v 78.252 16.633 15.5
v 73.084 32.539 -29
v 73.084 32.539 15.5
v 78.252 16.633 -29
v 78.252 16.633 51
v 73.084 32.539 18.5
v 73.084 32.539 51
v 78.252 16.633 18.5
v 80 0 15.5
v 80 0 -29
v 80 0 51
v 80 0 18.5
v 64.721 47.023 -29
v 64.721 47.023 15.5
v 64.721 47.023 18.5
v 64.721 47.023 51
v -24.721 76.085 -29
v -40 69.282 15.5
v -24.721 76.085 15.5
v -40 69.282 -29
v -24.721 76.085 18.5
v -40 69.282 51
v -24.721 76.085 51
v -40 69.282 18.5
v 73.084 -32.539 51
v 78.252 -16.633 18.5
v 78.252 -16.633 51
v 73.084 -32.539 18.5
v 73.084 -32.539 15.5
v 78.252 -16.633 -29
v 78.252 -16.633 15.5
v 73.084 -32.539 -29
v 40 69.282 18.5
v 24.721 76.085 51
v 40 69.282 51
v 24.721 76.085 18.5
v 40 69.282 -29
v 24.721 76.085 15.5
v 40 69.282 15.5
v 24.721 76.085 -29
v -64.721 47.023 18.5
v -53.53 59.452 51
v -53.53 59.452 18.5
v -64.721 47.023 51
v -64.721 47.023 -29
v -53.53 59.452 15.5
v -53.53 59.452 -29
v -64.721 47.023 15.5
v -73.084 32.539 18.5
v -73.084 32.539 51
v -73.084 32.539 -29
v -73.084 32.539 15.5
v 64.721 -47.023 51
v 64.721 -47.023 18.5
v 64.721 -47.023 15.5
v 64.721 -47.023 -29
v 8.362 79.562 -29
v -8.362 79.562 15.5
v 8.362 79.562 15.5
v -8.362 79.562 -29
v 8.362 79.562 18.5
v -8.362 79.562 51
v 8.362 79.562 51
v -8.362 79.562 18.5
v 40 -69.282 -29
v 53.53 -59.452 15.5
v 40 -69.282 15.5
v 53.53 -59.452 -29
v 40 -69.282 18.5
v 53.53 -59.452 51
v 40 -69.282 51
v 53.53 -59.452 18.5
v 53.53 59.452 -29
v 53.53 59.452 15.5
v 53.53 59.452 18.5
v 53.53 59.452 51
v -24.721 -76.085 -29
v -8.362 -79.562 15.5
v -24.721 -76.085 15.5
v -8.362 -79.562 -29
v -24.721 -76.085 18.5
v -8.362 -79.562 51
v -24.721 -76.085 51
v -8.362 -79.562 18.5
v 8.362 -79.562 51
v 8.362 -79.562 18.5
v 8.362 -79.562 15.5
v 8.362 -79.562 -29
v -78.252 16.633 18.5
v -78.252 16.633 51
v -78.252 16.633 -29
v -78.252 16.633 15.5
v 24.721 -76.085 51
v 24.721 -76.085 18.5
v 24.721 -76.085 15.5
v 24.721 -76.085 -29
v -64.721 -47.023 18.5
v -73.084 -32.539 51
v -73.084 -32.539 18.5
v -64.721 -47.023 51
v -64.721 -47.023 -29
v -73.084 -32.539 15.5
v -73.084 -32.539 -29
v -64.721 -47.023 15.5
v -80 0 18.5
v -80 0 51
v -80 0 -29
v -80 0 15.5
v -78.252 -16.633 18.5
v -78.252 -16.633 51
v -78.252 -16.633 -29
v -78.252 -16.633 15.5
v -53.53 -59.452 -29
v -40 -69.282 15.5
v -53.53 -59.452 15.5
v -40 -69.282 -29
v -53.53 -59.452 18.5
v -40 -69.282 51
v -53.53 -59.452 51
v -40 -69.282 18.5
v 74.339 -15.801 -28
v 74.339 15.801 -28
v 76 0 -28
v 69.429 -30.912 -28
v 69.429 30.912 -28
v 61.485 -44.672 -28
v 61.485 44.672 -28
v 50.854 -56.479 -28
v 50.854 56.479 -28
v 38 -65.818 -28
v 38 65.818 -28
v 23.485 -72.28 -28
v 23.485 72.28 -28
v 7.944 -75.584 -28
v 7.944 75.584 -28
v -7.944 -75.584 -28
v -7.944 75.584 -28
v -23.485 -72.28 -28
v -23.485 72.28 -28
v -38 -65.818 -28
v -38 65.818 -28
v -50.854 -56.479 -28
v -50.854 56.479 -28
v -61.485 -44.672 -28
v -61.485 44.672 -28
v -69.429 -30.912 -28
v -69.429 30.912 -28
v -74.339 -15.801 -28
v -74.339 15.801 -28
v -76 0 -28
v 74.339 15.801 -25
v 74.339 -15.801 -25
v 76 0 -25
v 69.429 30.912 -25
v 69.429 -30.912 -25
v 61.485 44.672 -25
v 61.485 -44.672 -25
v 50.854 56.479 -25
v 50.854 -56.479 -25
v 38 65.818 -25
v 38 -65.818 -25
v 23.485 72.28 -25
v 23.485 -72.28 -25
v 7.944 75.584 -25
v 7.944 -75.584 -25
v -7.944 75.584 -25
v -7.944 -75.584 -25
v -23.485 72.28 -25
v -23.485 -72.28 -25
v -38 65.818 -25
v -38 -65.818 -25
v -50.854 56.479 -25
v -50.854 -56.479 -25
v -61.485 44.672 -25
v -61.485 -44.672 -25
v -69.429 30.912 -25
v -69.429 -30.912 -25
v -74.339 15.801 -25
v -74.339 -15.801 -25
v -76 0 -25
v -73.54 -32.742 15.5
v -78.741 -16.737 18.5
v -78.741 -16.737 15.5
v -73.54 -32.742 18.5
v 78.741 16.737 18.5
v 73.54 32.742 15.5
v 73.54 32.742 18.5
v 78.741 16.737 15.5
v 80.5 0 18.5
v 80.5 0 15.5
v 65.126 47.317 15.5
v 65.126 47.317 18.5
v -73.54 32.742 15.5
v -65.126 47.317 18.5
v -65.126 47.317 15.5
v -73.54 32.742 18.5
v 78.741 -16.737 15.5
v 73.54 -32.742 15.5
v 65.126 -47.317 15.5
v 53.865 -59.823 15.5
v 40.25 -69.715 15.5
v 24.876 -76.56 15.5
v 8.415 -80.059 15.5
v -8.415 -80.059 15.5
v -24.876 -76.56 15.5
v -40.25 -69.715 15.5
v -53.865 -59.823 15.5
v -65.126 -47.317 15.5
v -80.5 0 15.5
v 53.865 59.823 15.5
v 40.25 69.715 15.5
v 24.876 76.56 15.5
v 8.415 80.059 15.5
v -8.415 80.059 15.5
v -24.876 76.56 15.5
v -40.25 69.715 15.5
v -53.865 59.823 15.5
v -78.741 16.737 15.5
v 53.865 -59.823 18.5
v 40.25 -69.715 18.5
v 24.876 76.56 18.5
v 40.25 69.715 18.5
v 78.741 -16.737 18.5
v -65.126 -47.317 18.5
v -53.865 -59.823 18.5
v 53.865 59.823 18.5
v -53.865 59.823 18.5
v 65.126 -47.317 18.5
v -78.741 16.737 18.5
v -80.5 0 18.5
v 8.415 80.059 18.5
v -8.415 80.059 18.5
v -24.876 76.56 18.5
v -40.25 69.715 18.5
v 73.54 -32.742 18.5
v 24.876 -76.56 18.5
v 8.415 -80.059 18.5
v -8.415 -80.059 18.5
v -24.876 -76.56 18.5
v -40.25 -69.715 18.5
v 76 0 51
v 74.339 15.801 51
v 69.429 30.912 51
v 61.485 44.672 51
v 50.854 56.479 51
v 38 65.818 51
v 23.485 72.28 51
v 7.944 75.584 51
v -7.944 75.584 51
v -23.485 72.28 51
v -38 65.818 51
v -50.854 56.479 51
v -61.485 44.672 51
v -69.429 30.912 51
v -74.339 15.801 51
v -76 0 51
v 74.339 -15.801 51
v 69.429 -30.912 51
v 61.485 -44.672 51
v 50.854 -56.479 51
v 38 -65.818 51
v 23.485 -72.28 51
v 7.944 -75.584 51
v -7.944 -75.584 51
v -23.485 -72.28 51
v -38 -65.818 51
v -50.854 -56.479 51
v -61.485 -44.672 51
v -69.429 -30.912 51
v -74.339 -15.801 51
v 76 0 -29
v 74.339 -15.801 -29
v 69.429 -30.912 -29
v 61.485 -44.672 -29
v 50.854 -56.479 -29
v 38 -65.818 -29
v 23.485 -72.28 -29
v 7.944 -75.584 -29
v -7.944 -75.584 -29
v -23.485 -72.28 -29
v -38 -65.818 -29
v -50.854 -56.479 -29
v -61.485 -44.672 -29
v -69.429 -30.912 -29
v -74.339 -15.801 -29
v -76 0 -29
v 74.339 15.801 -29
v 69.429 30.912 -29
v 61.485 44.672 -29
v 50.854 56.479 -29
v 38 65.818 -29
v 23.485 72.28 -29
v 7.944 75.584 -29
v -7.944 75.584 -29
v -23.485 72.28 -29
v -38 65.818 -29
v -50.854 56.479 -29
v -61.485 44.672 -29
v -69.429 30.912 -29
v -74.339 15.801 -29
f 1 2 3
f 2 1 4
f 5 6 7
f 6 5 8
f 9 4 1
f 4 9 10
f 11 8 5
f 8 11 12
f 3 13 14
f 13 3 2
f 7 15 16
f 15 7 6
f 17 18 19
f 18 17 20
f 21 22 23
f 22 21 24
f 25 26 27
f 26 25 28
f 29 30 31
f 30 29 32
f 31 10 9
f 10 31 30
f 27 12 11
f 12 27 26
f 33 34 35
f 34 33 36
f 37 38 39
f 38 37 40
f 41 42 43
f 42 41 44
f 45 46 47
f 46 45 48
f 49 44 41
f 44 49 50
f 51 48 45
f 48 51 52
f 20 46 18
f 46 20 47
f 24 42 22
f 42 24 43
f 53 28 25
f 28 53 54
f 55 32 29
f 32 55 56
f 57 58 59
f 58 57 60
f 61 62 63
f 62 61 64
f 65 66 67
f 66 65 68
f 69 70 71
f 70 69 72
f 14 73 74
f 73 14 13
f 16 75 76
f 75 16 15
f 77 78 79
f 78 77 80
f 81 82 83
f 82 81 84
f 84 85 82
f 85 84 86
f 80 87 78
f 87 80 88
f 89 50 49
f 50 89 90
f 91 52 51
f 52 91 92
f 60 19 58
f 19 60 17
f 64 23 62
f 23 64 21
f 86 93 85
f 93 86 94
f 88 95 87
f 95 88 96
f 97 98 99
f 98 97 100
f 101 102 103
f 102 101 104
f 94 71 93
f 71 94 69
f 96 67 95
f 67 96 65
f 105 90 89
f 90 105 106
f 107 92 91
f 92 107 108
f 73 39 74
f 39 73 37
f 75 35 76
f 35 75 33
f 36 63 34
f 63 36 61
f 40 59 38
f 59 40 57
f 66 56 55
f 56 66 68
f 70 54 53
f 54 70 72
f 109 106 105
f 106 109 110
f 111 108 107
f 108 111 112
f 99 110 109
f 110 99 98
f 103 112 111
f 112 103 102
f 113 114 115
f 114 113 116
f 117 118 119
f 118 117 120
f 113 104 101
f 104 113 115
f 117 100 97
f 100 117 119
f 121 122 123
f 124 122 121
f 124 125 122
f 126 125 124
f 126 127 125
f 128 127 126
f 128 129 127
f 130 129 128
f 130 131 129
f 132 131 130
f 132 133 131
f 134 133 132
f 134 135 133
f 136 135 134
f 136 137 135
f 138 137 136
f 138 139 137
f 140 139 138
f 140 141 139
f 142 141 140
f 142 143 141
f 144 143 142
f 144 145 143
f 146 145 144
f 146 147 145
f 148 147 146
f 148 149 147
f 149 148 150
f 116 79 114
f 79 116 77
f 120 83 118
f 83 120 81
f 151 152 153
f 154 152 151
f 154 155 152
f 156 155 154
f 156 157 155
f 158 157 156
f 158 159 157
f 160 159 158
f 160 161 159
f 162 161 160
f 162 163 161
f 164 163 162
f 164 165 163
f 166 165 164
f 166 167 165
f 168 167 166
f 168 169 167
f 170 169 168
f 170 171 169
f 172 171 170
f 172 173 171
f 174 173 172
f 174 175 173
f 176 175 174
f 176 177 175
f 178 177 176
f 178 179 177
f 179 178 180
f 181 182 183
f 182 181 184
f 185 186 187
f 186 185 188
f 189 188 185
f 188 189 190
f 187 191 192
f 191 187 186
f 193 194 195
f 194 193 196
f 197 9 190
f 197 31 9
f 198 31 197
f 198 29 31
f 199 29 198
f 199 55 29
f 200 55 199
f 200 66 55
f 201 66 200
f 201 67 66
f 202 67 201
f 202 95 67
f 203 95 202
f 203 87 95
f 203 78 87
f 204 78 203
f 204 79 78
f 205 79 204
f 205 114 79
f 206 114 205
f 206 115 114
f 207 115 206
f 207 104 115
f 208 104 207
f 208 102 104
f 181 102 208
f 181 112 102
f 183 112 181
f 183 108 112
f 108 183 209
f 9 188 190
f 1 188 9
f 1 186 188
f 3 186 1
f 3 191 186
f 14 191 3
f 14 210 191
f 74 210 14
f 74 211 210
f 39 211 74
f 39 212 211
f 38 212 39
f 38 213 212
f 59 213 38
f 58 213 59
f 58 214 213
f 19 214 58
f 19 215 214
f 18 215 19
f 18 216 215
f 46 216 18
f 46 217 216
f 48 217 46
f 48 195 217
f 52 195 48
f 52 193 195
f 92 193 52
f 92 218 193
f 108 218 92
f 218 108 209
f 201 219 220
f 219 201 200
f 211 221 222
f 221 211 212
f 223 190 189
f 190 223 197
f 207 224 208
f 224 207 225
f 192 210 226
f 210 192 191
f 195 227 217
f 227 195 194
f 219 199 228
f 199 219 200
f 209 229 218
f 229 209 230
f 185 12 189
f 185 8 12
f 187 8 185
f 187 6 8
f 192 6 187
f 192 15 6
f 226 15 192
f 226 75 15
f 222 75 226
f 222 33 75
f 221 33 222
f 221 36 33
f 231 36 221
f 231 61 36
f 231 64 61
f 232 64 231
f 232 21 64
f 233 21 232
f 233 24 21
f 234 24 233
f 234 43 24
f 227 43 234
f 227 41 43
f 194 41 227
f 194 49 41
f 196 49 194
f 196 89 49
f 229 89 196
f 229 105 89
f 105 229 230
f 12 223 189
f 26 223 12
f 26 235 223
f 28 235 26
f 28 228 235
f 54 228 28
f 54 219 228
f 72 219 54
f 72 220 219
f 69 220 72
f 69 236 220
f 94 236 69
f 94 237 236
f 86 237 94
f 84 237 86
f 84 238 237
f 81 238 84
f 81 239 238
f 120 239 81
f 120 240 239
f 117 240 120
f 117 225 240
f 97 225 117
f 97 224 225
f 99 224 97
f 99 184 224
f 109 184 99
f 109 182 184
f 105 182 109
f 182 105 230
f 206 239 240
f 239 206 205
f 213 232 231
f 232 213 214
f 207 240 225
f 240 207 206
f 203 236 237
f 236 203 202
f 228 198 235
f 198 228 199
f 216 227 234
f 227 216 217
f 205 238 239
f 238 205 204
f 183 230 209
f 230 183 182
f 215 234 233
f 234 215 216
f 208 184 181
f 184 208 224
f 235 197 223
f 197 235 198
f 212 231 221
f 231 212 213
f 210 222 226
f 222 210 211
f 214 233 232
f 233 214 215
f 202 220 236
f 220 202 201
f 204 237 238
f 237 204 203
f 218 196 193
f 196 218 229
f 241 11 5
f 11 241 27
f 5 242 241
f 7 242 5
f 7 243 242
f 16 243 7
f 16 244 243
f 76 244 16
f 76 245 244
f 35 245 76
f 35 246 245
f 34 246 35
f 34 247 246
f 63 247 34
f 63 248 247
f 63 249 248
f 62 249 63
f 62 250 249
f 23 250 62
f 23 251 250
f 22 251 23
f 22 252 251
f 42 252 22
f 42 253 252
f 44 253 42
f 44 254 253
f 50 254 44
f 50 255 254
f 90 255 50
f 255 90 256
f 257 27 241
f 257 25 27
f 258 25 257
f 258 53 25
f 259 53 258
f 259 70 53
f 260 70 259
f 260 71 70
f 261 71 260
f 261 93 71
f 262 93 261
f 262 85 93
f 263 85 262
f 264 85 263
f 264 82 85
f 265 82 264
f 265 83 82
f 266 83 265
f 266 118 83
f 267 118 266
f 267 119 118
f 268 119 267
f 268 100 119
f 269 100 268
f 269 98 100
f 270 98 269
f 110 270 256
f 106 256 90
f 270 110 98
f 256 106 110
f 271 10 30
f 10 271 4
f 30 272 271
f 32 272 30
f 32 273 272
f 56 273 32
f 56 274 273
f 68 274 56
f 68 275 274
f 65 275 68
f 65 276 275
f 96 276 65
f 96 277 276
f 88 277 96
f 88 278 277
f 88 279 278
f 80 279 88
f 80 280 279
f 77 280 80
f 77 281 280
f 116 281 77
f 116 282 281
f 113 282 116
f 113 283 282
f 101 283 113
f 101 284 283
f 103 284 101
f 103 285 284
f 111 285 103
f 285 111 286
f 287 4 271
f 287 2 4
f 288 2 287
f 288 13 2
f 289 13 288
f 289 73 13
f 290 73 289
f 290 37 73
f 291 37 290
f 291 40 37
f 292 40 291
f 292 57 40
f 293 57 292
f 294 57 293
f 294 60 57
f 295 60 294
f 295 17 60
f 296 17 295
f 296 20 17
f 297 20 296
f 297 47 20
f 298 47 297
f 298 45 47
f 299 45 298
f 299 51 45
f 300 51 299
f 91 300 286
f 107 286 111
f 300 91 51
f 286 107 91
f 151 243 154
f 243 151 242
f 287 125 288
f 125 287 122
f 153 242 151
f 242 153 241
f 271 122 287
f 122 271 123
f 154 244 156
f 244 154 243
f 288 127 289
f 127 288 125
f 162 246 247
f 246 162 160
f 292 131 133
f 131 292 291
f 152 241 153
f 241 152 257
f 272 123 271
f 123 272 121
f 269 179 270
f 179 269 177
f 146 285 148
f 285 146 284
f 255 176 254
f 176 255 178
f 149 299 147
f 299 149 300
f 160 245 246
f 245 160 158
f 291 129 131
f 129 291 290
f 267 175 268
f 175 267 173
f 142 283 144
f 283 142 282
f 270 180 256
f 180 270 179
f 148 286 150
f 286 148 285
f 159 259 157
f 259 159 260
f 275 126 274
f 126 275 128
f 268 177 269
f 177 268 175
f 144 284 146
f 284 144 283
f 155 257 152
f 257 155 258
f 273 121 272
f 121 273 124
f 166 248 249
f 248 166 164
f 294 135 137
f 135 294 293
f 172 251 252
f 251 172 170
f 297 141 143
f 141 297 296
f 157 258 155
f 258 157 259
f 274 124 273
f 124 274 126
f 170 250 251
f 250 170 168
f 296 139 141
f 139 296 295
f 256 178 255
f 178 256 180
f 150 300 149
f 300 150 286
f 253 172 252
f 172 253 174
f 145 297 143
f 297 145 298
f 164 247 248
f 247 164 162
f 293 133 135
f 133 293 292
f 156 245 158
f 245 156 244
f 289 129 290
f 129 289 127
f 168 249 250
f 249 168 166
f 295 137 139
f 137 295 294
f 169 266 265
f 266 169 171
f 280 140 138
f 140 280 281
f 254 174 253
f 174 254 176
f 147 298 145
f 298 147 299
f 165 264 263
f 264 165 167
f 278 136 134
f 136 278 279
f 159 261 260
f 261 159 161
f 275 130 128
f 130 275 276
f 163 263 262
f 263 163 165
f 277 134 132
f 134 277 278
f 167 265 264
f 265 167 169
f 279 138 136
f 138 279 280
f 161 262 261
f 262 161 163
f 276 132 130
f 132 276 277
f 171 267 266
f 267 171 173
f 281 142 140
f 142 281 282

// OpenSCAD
// Parameters
nominal_size = 160; //[80:320:1]
cap_outer_diameter = 160; //[120:240:1]
cap_wall_thickness = 4; //[2:8:0.5]
socket_inner_diameter = 160; //[120:240:1]
tolerance_clearance = 0.5; //[0.1:1.5:0.1]
socket_depth = 50; //[25:100:1]
end_face_thickness = 6; //[3:12:0.5]
internal_stop_position_from_open_end = 45; //[20:90:1]
internal_stop_thickness = 3; //[1:8:0.5]
fillet_radius = 2; //[0:6:0.5]
overlap = 1; //[0.5:2:0.5]
pipe_wall_thickness = 4; //[2:8:0.5]
pipe_stub_length = 80; //[40:160:1]

// HT Pipe - complete geometry
module ht_pipe() {
  color([0.85, 0.85, 0.8]) {
    // Cap outer cylinder
    difference() {
      translate([0, 0, 0])
        cylinder(r=cap_outer_diameter/2, h=socket_depth + end_face_thickness, center=true);
      // Cap inner void cylinder
      translate([0, 0, end_face_thickness/2])
        cylinder(r=(socket_inner_diameter + 2*tolerance_clearance)/2, h=socket_depth + end_face_thickness, center=true);
    }
    
    // Internal stop ring
    difference() {
      translate([0, 0, -(socket_depth + end_face_thickness)/2 + internal_stop_position_from_open_end])
        cylinder(r=(socket_inner_diameter + 2*tolerance_clearance)/2, h=internal_stop_thickness, center=true);
      translate([0, 0, -(socket_depth + end_face_thickness)/2 + internal_stop_position_from_open_end])
        cylinder(r=(socket_inner_diameter + 2*tolerance_clearance)/2 - cap_wall_thickness, h=internal_stop_thickness + 2*overlap, center=true);
    }
    
    // Pipe outer cylinder
    difference() {
      translate([0, 0, -(socket_depth + end_face_thickness)/2 + pipe_stub_length/2 - overlap])
        cylinder(r=socket_inner_diameter/2, h=pipe_stub_length, center=true);
      // Pipe inner void cylinder
      translate([0, 0, -(socket_depth + end_face_thickness)/2 + pipe_stub_length/2 - overlap])
        cylinder(r=socket_inner_diameter/2 - pipe_wall_thickness, h=pipe_stub_length + 2*overlap, center=true);
    }
  }
}

// Assembly
module assembly() {
  ht_pipe();
}

assembly();
